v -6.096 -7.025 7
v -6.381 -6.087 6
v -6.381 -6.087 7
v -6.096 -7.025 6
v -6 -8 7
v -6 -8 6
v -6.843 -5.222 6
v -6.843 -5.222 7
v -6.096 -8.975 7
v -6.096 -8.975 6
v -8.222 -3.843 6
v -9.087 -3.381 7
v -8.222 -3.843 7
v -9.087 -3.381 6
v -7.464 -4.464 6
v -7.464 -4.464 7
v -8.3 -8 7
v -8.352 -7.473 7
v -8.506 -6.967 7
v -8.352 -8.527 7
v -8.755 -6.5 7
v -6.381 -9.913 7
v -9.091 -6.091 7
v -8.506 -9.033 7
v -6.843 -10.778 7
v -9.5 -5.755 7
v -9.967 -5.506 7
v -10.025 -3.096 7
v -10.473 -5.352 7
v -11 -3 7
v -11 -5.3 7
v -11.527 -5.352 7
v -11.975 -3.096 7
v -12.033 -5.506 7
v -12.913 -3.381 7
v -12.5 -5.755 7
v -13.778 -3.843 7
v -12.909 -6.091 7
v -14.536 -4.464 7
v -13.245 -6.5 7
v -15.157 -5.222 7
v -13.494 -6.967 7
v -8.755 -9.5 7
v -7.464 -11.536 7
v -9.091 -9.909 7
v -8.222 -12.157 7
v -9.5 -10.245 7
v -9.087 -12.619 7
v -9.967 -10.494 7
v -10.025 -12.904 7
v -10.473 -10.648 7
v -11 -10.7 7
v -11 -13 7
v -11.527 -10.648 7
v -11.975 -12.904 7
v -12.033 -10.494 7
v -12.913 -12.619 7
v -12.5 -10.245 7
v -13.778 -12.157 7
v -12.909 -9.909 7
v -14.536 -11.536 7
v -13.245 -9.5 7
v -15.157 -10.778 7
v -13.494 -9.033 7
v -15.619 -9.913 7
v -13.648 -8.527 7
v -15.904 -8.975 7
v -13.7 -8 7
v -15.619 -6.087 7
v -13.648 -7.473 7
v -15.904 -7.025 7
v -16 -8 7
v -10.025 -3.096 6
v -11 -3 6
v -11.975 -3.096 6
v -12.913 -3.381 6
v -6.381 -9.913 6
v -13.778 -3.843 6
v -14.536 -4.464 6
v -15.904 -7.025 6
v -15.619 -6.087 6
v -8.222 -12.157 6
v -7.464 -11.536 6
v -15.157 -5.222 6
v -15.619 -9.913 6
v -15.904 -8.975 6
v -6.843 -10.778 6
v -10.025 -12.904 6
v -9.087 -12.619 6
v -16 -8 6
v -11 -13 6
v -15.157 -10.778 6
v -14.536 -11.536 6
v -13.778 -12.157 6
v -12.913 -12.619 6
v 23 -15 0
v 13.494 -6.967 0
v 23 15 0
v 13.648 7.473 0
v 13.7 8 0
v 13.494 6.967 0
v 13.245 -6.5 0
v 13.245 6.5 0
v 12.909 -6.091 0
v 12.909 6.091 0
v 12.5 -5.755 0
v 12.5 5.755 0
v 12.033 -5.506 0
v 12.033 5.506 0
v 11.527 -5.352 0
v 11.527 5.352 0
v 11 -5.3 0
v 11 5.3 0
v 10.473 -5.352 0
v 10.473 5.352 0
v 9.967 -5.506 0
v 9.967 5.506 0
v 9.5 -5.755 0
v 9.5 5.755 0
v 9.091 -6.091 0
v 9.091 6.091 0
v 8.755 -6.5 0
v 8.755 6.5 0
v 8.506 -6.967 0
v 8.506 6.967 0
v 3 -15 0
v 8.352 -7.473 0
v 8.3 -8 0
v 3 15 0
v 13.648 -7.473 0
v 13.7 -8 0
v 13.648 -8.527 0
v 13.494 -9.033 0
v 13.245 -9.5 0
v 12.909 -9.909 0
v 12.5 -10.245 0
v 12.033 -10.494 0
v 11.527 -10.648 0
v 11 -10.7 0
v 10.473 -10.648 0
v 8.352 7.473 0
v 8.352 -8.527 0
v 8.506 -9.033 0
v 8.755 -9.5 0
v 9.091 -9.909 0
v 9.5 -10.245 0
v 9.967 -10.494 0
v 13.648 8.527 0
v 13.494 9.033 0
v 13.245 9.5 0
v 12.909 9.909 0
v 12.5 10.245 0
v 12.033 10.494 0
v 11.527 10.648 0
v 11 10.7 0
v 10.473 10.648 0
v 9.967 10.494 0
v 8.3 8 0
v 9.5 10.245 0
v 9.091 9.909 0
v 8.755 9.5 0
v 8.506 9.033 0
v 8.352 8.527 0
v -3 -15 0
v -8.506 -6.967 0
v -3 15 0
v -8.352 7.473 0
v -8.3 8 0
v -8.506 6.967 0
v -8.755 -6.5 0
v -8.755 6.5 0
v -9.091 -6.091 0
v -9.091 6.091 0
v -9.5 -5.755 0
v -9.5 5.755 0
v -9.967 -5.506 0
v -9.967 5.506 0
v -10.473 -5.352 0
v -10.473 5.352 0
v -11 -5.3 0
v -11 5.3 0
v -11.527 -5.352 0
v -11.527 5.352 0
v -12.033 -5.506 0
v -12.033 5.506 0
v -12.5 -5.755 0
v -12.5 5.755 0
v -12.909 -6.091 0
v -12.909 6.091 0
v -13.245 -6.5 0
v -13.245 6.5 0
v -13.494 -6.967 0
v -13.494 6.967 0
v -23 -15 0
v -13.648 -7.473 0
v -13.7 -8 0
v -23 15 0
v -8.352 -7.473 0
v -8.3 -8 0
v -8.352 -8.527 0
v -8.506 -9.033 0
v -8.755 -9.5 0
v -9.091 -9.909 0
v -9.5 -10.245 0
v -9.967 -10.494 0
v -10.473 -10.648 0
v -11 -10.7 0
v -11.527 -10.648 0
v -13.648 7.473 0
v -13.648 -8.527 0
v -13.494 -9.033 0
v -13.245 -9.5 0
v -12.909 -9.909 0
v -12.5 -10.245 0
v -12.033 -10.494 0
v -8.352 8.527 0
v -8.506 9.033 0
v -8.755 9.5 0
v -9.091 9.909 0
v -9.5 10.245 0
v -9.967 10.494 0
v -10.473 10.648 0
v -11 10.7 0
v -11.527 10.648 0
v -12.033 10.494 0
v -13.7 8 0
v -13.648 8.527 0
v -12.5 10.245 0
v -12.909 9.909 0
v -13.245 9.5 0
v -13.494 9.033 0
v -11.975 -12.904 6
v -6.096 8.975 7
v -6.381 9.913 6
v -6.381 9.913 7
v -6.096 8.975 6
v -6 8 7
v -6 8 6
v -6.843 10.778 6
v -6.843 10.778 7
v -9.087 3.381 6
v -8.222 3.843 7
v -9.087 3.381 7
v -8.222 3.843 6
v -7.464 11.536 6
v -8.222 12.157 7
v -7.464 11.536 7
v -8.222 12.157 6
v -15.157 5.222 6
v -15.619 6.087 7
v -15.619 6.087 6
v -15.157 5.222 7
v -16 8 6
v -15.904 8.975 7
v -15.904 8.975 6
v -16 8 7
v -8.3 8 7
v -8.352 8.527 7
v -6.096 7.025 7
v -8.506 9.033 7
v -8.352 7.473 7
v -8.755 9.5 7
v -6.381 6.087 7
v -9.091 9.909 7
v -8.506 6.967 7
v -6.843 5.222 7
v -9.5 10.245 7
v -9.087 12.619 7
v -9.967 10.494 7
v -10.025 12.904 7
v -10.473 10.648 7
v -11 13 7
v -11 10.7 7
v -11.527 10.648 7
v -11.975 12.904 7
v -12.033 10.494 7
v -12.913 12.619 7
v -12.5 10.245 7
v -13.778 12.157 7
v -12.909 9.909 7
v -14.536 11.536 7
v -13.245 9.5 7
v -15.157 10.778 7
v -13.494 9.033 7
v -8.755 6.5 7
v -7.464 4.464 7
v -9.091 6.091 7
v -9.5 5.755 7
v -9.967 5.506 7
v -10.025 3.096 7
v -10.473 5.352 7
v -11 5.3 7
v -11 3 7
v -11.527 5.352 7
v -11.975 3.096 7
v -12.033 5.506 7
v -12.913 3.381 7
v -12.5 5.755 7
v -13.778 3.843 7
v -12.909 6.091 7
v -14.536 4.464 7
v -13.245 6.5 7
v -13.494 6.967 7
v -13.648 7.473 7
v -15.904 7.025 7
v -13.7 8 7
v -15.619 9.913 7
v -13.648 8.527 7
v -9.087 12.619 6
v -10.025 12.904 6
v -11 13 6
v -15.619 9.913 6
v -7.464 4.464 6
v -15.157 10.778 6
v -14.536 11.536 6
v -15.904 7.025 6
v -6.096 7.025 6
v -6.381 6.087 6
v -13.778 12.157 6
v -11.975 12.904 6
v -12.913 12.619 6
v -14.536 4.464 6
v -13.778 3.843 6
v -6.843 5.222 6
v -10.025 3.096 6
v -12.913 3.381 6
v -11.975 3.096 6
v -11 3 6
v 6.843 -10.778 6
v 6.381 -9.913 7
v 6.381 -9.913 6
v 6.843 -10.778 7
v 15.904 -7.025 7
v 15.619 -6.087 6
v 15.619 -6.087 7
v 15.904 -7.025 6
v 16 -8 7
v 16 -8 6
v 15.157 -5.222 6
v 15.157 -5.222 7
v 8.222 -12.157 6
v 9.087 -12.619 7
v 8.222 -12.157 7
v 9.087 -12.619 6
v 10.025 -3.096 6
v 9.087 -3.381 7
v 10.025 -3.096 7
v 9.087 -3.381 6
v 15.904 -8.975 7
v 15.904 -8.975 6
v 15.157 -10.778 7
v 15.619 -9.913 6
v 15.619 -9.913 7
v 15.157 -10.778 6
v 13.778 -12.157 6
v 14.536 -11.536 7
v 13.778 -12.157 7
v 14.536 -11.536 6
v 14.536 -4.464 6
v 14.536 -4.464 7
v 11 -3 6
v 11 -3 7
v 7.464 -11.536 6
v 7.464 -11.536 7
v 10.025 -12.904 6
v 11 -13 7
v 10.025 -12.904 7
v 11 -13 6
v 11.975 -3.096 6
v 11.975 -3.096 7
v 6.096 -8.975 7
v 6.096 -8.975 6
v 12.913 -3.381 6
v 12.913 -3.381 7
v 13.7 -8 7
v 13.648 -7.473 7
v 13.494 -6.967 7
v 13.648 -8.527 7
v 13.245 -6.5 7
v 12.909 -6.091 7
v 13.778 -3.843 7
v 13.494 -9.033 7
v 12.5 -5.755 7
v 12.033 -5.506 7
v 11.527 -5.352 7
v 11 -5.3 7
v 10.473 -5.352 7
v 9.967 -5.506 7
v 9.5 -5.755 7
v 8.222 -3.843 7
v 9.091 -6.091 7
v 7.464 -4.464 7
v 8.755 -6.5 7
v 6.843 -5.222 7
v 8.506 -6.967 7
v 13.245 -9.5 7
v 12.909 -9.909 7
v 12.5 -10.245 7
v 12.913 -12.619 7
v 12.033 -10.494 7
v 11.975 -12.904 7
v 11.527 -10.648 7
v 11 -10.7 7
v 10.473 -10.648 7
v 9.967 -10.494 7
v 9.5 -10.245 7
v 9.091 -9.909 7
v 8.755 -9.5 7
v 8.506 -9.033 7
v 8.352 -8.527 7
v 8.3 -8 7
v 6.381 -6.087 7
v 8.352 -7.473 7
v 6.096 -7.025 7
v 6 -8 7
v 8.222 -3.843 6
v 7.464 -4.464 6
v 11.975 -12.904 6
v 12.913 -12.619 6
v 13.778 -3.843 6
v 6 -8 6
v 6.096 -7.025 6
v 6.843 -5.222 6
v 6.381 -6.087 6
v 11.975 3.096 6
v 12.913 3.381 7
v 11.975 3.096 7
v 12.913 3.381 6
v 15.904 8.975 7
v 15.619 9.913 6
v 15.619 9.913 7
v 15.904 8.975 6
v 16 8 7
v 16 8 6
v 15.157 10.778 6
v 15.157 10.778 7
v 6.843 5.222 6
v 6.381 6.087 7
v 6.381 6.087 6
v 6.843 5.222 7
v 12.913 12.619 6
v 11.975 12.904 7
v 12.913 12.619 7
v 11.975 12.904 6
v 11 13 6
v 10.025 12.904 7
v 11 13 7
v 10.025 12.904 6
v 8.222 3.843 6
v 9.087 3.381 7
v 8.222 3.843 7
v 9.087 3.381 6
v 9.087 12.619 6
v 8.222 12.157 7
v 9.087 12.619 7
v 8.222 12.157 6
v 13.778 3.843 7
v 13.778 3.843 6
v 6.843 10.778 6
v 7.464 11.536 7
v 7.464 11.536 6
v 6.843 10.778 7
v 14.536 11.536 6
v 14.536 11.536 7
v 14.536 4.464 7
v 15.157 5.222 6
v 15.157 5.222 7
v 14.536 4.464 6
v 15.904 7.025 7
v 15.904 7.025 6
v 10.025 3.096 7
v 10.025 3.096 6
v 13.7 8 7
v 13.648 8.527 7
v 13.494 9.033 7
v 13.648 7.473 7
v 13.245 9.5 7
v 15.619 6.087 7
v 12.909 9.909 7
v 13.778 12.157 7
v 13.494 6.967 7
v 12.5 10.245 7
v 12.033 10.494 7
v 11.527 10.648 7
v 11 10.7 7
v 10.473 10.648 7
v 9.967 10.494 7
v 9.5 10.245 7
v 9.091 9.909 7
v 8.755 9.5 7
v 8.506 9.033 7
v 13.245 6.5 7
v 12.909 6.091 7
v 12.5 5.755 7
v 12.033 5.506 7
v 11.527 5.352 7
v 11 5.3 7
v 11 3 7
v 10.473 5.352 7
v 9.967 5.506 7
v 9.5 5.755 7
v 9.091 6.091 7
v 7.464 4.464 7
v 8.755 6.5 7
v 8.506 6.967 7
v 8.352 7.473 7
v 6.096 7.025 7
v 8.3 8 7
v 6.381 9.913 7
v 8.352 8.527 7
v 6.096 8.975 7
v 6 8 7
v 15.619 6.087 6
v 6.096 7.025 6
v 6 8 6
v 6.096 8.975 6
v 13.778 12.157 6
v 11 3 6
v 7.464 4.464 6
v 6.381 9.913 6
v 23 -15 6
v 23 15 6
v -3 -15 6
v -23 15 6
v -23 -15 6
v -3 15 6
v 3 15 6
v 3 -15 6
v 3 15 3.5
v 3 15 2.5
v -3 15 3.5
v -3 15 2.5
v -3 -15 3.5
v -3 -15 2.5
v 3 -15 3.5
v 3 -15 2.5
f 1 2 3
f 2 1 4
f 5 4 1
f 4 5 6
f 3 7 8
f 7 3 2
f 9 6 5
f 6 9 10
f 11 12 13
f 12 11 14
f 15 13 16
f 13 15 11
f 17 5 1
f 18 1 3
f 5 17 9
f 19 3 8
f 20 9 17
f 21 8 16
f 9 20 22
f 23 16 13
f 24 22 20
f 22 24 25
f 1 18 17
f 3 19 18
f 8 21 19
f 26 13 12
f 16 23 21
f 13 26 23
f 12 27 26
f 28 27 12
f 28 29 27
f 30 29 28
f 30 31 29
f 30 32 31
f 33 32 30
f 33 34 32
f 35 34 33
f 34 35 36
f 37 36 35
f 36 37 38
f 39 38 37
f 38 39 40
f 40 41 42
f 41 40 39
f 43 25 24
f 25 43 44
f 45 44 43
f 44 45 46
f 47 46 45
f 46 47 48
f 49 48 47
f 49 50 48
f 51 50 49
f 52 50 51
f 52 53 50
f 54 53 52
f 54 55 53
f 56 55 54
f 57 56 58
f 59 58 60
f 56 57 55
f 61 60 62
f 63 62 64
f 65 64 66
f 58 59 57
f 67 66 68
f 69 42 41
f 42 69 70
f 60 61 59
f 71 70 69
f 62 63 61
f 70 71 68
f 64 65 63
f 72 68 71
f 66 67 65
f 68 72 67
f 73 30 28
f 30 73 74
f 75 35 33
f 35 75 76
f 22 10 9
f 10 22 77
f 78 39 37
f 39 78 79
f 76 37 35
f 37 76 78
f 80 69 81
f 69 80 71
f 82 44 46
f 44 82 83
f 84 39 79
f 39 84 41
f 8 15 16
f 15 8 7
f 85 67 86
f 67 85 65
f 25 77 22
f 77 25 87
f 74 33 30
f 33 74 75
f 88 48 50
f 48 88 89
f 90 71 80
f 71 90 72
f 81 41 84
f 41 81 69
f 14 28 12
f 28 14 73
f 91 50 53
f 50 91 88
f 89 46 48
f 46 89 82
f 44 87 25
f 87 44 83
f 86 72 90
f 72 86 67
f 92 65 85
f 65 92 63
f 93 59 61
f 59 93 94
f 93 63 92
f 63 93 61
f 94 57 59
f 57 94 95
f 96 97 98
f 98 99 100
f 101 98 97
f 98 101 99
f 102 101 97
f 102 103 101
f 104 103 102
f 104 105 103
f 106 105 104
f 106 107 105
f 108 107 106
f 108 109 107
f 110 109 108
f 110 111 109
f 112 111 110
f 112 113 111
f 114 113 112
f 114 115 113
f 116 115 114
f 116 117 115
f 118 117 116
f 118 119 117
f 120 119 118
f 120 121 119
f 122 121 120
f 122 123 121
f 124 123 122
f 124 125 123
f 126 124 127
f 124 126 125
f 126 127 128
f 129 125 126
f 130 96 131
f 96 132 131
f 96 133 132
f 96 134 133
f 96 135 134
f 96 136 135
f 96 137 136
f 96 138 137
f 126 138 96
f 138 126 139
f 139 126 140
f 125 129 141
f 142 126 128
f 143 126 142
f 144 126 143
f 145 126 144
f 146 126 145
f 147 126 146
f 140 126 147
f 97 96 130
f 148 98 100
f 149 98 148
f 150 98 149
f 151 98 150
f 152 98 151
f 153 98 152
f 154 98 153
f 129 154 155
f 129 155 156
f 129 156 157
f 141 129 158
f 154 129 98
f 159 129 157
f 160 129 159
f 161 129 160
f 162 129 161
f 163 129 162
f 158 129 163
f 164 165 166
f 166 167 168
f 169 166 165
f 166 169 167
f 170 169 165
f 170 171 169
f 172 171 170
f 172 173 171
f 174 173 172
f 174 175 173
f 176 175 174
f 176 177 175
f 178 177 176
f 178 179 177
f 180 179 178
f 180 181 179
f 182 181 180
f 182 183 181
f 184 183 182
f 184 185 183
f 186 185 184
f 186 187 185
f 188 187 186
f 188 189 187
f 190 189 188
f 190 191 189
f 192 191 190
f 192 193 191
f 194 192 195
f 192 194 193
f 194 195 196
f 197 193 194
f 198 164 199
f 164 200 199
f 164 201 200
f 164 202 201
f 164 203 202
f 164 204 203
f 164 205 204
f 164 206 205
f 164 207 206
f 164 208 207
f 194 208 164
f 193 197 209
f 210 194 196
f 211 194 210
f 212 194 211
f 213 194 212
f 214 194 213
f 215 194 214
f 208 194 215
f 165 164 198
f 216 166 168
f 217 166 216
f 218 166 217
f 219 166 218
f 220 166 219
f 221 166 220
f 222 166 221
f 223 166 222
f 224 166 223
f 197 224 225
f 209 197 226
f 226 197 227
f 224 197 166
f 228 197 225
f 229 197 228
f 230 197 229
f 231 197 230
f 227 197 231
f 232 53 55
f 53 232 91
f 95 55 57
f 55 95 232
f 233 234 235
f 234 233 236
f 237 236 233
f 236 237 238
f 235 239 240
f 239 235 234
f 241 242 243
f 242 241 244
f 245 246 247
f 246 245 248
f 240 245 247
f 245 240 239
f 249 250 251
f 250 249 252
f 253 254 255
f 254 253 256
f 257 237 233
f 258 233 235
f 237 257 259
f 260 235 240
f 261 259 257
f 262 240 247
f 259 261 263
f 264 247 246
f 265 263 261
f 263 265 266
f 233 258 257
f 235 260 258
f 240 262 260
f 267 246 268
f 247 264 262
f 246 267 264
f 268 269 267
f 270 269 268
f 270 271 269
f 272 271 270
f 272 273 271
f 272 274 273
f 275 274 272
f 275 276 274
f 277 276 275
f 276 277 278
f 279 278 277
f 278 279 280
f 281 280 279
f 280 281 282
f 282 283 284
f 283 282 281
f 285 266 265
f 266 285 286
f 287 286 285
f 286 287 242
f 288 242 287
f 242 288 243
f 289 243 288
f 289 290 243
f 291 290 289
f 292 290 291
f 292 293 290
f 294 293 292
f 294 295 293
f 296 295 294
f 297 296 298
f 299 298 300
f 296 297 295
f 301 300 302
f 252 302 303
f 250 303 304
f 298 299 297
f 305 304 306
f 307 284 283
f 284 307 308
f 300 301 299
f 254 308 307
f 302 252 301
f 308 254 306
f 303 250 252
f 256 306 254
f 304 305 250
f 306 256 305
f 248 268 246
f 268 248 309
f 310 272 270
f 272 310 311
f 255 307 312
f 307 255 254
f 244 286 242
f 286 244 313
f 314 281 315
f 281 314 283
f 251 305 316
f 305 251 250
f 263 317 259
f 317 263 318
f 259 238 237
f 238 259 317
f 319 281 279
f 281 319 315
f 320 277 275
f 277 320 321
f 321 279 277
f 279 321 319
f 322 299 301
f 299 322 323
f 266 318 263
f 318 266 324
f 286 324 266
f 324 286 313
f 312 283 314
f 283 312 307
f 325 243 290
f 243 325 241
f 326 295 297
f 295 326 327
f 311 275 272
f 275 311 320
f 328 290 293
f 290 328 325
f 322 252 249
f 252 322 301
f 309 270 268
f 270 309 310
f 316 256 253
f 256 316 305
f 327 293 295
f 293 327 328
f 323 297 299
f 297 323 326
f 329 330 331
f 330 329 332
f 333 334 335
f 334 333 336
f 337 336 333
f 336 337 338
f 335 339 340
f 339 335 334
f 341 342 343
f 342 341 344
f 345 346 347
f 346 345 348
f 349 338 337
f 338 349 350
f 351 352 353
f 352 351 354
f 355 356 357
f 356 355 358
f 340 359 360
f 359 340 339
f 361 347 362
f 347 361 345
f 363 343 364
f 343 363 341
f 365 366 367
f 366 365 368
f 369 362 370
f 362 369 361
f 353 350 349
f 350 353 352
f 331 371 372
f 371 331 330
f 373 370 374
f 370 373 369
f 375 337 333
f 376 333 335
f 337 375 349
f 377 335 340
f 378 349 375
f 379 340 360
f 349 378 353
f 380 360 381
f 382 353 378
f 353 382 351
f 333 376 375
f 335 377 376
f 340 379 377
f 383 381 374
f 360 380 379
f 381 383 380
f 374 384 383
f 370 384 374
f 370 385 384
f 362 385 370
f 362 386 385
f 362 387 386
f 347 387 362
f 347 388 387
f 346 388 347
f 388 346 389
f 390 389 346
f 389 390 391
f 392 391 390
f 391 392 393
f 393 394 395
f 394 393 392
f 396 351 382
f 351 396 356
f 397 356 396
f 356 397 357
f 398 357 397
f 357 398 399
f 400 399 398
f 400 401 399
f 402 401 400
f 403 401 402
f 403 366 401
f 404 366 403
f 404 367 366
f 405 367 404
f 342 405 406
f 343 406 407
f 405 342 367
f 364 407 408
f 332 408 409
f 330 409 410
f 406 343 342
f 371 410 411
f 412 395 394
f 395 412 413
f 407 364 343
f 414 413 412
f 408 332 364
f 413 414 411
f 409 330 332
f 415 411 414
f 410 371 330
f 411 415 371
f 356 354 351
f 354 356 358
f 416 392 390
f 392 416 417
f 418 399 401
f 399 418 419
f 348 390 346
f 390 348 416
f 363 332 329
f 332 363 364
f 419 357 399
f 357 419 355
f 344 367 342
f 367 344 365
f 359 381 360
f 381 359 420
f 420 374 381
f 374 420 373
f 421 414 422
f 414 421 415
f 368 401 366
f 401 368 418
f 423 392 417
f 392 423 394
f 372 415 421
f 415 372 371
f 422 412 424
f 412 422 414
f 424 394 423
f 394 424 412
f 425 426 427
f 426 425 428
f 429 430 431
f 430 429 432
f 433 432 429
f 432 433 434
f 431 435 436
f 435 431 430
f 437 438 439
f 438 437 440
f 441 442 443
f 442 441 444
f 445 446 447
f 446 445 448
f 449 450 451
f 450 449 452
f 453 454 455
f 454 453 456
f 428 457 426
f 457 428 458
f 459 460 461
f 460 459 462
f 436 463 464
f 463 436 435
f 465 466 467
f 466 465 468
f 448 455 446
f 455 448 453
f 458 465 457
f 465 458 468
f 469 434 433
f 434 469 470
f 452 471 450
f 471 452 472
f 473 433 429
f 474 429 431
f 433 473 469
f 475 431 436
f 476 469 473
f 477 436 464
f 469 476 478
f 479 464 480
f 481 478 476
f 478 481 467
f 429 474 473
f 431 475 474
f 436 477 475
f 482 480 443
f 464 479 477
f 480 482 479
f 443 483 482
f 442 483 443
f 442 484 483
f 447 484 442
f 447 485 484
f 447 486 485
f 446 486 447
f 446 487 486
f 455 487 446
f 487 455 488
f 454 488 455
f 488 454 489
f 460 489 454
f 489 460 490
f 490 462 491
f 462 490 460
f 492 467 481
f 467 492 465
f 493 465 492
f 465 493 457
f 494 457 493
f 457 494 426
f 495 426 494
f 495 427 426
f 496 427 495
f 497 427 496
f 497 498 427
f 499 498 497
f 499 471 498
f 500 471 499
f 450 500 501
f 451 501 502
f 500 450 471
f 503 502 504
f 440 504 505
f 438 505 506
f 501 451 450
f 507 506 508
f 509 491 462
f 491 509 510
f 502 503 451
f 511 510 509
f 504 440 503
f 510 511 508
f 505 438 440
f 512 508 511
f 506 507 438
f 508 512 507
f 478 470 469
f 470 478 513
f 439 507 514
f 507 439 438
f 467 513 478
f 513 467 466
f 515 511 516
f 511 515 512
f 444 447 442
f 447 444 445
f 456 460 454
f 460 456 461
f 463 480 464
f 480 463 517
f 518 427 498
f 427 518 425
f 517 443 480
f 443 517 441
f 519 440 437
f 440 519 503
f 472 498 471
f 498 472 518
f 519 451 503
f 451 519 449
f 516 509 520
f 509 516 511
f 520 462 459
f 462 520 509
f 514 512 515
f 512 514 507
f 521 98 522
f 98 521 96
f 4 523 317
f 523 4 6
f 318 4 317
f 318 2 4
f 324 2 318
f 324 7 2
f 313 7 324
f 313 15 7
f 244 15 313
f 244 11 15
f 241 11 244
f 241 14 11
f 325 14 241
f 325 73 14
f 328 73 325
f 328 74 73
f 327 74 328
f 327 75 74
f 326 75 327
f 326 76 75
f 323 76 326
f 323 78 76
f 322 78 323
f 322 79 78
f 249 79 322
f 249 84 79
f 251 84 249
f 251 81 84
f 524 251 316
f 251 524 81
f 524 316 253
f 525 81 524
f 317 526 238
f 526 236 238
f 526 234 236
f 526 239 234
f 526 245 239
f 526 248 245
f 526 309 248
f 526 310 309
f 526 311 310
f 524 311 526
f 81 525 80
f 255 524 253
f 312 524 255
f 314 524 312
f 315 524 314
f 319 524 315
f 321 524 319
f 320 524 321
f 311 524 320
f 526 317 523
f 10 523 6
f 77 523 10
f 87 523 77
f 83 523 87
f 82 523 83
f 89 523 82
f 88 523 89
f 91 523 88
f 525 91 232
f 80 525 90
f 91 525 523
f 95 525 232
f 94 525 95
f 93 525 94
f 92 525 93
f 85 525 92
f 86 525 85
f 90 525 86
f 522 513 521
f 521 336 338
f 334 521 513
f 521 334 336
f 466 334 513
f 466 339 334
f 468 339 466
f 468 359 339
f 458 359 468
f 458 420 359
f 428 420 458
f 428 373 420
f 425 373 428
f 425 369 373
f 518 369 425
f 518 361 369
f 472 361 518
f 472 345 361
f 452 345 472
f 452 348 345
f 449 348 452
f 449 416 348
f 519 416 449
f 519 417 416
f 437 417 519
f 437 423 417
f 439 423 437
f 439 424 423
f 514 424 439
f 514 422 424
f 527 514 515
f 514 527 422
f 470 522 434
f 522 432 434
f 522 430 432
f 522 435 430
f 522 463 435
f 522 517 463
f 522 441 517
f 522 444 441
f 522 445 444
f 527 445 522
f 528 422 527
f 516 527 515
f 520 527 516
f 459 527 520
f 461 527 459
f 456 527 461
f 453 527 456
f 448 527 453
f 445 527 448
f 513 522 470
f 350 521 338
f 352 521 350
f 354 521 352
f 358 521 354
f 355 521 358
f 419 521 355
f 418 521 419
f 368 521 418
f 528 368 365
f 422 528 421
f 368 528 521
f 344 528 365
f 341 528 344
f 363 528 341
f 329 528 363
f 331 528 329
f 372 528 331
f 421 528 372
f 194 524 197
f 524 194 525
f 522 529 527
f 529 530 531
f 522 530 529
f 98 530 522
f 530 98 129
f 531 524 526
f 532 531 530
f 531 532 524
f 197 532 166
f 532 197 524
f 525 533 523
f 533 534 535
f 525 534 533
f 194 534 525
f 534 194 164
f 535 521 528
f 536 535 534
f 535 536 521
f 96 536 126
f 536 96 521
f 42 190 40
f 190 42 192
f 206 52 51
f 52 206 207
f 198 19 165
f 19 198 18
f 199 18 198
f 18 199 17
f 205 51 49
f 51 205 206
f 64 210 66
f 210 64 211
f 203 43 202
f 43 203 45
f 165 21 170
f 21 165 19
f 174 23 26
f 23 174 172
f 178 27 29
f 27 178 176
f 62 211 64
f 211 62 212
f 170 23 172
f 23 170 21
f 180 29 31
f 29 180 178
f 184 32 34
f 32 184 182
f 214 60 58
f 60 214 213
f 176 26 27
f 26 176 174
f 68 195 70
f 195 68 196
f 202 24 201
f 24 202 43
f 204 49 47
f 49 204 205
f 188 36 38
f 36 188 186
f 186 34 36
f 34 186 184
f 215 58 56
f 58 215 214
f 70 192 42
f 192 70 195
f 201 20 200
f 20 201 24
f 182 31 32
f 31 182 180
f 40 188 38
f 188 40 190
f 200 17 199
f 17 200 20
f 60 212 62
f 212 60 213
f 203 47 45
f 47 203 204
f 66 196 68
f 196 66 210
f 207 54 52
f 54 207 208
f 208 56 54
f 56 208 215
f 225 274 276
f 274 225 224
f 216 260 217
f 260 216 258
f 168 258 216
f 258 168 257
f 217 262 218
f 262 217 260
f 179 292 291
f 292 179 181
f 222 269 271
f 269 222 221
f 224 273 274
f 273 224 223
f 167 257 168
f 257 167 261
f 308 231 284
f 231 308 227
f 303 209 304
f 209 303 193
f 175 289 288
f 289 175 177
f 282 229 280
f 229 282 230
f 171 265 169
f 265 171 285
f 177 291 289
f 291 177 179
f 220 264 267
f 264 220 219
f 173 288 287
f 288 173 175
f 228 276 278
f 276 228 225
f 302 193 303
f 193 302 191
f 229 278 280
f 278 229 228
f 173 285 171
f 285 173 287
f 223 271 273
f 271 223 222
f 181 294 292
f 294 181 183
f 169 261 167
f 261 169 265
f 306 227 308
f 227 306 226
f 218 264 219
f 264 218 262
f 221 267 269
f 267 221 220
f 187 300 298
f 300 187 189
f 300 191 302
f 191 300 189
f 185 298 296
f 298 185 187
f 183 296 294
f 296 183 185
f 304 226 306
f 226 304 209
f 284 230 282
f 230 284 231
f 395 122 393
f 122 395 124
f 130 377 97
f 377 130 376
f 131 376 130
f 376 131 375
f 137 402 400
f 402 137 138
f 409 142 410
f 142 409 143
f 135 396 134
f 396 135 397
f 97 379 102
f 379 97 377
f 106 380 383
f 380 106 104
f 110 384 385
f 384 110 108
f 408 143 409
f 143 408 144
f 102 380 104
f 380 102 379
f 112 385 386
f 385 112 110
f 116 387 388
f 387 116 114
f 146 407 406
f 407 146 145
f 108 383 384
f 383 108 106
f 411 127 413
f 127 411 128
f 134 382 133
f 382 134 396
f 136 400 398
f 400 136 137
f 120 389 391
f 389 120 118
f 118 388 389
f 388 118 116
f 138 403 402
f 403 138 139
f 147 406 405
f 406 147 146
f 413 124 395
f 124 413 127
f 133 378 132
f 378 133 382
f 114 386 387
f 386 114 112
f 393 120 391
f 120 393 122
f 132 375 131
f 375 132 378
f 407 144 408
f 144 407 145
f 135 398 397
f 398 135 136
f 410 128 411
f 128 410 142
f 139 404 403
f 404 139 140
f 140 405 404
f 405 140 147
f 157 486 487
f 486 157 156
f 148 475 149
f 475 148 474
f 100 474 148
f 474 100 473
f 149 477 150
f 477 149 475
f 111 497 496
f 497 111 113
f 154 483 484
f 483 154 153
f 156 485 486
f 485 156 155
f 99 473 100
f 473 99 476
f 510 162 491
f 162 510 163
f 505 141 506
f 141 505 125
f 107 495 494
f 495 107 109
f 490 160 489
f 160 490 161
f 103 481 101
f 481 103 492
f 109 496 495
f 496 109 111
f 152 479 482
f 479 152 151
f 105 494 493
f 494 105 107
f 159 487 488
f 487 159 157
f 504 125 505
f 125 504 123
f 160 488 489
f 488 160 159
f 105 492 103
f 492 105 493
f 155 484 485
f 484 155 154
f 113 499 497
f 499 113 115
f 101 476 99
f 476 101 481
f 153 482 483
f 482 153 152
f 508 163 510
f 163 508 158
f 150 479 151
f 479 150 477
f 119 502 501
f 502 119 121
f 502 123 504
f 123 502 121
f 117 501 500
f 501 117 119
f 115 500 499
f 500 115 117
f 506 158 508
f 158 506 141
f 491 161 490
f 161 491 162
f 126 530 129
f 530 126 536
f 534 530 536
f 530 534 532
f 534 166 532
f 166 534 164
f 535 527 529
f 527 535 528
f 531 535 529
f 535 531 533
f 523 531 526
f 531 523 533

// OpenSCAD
$fn = 32;

// ----------------------------------------------------------------------
// Living hinge: 46 x 30 mm plates, 1 mm flexible web
// ----------------------------------------------------------------------

// --- parameters (mm) ---
plate_len = 20;           // plate length outside the web
plate_w = 30;             // plate width
thick = 6;                // plate thickness
web_half = 3;             // half width of the flex band
web_t = 1;                // flexible web thickness
web_z = 2.5;              // web position inside the thickness
boss_d = 10;              // screw boss diameter
boss_h = 7;               // screw boss height
boss_x = 11;              // screw boss distance from the web
screw_d = 5.4;            // screw hole

difference() {
  union() {
    /* one flat strip, later thinned at the middle */
    translate([-23, -15, 0]) cube([46, 30, 6]);
    /* screw bosses, sunk 0.5 mm into the plates */
    for (sx = [-11, 11]) {
      for (sy = [-8, 8]) {
        translate([sx, sy, 0]) cylinder(h = boss_h, d = boss_d);
      }
    }
  }
  /* channel from below: leaves the web on top of it */
  translate([-3, -17.5, -2.5]) cube([6, 35, 5]);
  /* channel from above: thins the web down to web_t */
  translate([-3, -17.5, 3.5]) cube([6, 35, 5]);
  /* screw holes through the bosses */
  for (sx = [-11, 11]) {
    for (sy = [-8, 8]) {
      translate([sx, sy, -2.5]) cylinder(h = boss_h + 5, d = screw_d);
    }
  }
}
